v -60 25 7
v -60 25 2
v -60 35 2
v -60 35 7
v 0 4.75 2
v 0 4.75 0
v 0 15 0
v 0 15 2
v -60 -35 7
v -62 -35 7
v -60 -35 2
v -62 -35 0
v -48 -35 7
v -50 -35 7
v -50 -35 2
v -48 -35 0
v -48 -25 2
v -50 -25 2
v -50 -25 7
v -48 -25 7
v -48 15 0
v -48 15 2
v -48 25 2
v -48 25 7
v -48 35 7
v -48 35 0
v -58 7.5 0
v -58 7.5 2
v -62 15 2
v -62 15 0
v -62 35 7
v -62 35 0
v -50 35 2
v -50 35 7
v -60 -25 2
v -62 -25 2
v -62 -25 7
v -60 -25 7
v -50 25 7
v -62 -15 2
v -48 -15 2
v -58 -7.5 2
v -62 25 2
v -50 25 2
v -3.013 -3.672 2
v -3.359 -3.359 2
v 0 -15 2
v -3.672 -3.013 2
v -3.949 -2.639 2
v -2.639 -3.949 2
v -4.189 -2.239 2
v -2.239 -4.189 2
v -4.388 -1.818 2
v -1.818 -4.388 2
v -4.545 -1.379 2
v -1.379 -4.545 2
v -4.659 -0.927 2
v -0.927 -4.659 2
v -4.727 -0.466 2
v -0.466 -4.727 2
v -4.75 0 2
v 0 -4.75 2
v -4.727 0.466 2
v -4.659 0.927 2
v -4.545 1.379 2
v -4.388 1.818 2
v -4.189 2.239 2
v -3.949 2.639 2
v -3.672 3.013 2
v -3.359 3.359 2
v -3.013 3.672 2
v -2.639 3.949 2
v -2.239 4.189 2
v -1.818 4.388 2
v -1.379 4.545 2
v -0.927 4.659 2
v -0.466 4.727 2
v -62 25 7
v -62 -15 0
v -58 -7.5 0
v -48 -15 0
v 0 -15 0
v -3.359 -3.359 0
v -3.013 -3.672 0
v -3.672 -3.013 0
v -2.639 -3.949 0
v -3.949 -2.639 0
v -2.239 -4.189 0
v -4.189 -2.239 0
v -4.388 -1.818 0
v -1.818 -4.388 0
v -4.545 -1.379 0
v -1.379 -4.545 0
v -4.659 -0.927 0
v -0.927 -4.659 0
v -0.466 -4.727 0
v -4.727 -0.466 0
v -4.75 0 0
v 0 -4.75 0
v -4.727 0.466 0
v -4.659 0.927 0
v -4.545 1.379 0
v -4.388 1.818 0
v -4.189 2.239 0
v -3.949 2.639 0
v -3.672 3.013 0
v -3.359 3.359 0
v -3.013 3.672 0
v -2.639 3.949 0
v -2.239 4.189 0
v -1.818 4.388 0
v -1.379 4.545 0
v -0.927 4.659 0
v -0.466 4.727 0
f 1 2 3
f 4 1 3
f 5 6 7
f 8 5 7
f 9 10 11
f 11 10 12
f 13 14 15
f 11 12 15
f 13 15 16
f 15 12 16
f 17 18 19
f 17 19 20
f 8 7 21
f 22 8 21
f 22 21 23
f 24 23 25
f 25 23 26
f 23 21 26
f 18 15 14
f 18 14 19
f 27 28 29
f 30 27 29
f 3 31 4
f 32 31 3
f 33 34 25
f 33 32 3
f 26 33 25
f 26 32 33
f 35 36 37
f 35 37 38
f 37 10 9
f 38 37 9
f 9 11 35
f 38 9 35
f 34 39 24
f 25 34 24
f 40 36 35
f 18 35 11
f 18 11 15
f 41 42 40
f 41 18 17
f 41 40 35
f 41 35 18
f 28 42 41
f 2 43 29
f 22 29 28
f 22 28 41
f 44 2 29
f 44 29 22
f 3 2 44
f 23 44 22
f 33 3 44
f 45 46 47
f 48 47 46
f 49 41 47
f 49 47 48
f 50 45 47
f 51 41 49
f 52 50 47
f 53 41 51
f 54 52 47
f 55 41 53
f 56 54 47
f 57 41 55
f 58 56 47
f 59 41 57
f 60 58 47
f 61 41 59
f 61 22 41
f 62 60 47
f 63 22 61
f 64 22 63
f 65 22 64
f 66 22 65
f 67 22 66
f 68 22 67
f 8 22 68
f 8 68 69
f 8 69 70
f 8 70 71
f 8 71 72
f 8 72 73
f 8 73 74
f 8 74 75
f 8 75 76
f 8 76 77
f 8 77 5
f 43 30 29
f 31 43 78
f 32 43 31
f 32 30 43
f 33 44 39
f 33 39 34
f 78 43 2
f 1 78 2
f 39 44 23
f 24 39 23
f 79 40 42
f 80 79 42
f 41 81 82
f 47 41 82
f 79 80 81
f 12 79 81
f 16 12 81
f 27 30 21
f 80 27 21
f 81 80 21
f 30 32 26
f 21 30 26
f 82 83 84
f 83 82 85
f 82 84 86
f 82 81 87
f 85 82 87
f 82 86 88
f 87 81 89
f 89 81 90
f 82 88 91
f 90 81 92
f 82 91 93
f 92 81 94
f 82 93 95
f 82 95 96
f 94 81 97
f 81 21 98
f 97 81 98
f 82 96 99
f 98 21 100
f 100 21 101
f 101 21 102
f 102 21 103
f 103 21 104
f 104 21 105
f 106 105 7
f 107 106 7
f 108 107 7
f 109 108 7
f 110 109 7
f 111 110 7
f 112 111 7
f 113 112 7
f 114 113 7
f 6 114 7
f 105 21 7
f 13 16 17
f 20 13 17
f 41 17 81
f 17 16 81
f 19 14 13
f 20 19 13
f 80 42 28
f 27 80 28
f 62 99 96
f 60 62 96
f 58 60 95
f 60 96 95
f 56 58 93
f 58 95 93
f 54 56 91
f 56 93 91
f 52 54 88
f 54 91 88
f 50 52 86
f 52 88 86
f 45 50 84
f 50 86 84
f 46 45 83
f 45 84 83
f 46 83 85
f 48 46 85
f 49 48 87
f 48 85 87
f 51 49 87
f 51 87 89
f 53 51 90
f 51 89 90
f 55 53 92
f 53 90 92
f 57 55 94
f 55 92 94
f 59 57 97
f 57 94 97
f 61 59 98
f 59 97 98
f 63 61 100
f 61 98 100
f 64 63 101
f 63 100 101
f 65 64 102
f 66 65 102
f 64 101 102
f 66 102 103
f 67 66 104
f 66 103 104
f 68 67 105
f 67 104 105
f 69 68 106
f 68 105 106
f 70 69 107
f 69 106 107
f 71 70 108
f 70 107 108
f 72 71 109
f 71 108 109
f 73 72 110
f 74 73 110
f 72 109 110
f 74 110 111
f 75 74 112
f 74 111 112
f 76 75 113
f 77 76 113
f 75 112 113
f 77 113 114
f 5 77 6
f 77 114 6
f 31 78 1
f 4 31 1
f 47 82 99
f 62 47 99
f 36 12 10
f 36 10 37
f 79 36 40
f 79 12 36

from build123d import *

# Parameters (mm, degrees)
F1_DEPTH = 2
F0_W     = 2
F0_H     = 10
F2_DEPTH = 7
F5_DEPTH = 25


with BuildPart() as f1:
    # F0 (on Top) → F1 (new body)
    with BuildSketch(Plane.XY):
        with BuildLine():
            Line((0, 15), (-48, 15))
            Line((-48, 15), (-48, 25))
            Line((-48, 25), (-50, 25))
            Line((-50, 25), (-50, 35))
            Line((-50, 35), (-60, 35))
            Line((-60, 35), (-60, 25))
            Line((-60, 25), (-62, 25))
            Line((-62, 25), (-62, -25))
            Line((-62, -25), (-60, -25))
            Line((-60, -25), (-60, -35))
            Line((-60, -35), (-50, -35))
            Line((-50, -35), (-50, -25))
            Line((-50, -25), (-48, -25))
            Line((-48, -25), (-48, -15))
            Line((-48, -15), (0, -15))
            Line((0, -15), (0, -4.75))
            ThreePointArc((0, -4.75), (-4.75, 0), (0, 4.75))
            Line((0, 4.75), (0, 15))
        make_face()
    extrude(amount=F1_DEPTH)

    # F0 (on Top) → F2 (join)
    with BuildSketch(Plane.XY):
        with Locations((-61, 30)):
            Rectangle(F0_W, F0_H)
        with Locations((-49, 30)):
            Rectangle(F0_W, F0_H)
        with Locations((-61, -30)):
            Rectangle(F0_W, F0_H)
        with Locations((-49, -30)):
            Rectangle(F0_W, F0_H)
    extrude(amount=F2_DEPTH)

    # F4 (on face) → F5 (cut)
    with BuildSketch(Plane.XY.offset(2)):
        Polygon((-62, 15), (-62, -15), (-58, -7.5), (-58, 7.5), align=None)
    extrude(amount=-F5_DEPTH, mode=Mode.SUBTRACT)


solid = f1.part
